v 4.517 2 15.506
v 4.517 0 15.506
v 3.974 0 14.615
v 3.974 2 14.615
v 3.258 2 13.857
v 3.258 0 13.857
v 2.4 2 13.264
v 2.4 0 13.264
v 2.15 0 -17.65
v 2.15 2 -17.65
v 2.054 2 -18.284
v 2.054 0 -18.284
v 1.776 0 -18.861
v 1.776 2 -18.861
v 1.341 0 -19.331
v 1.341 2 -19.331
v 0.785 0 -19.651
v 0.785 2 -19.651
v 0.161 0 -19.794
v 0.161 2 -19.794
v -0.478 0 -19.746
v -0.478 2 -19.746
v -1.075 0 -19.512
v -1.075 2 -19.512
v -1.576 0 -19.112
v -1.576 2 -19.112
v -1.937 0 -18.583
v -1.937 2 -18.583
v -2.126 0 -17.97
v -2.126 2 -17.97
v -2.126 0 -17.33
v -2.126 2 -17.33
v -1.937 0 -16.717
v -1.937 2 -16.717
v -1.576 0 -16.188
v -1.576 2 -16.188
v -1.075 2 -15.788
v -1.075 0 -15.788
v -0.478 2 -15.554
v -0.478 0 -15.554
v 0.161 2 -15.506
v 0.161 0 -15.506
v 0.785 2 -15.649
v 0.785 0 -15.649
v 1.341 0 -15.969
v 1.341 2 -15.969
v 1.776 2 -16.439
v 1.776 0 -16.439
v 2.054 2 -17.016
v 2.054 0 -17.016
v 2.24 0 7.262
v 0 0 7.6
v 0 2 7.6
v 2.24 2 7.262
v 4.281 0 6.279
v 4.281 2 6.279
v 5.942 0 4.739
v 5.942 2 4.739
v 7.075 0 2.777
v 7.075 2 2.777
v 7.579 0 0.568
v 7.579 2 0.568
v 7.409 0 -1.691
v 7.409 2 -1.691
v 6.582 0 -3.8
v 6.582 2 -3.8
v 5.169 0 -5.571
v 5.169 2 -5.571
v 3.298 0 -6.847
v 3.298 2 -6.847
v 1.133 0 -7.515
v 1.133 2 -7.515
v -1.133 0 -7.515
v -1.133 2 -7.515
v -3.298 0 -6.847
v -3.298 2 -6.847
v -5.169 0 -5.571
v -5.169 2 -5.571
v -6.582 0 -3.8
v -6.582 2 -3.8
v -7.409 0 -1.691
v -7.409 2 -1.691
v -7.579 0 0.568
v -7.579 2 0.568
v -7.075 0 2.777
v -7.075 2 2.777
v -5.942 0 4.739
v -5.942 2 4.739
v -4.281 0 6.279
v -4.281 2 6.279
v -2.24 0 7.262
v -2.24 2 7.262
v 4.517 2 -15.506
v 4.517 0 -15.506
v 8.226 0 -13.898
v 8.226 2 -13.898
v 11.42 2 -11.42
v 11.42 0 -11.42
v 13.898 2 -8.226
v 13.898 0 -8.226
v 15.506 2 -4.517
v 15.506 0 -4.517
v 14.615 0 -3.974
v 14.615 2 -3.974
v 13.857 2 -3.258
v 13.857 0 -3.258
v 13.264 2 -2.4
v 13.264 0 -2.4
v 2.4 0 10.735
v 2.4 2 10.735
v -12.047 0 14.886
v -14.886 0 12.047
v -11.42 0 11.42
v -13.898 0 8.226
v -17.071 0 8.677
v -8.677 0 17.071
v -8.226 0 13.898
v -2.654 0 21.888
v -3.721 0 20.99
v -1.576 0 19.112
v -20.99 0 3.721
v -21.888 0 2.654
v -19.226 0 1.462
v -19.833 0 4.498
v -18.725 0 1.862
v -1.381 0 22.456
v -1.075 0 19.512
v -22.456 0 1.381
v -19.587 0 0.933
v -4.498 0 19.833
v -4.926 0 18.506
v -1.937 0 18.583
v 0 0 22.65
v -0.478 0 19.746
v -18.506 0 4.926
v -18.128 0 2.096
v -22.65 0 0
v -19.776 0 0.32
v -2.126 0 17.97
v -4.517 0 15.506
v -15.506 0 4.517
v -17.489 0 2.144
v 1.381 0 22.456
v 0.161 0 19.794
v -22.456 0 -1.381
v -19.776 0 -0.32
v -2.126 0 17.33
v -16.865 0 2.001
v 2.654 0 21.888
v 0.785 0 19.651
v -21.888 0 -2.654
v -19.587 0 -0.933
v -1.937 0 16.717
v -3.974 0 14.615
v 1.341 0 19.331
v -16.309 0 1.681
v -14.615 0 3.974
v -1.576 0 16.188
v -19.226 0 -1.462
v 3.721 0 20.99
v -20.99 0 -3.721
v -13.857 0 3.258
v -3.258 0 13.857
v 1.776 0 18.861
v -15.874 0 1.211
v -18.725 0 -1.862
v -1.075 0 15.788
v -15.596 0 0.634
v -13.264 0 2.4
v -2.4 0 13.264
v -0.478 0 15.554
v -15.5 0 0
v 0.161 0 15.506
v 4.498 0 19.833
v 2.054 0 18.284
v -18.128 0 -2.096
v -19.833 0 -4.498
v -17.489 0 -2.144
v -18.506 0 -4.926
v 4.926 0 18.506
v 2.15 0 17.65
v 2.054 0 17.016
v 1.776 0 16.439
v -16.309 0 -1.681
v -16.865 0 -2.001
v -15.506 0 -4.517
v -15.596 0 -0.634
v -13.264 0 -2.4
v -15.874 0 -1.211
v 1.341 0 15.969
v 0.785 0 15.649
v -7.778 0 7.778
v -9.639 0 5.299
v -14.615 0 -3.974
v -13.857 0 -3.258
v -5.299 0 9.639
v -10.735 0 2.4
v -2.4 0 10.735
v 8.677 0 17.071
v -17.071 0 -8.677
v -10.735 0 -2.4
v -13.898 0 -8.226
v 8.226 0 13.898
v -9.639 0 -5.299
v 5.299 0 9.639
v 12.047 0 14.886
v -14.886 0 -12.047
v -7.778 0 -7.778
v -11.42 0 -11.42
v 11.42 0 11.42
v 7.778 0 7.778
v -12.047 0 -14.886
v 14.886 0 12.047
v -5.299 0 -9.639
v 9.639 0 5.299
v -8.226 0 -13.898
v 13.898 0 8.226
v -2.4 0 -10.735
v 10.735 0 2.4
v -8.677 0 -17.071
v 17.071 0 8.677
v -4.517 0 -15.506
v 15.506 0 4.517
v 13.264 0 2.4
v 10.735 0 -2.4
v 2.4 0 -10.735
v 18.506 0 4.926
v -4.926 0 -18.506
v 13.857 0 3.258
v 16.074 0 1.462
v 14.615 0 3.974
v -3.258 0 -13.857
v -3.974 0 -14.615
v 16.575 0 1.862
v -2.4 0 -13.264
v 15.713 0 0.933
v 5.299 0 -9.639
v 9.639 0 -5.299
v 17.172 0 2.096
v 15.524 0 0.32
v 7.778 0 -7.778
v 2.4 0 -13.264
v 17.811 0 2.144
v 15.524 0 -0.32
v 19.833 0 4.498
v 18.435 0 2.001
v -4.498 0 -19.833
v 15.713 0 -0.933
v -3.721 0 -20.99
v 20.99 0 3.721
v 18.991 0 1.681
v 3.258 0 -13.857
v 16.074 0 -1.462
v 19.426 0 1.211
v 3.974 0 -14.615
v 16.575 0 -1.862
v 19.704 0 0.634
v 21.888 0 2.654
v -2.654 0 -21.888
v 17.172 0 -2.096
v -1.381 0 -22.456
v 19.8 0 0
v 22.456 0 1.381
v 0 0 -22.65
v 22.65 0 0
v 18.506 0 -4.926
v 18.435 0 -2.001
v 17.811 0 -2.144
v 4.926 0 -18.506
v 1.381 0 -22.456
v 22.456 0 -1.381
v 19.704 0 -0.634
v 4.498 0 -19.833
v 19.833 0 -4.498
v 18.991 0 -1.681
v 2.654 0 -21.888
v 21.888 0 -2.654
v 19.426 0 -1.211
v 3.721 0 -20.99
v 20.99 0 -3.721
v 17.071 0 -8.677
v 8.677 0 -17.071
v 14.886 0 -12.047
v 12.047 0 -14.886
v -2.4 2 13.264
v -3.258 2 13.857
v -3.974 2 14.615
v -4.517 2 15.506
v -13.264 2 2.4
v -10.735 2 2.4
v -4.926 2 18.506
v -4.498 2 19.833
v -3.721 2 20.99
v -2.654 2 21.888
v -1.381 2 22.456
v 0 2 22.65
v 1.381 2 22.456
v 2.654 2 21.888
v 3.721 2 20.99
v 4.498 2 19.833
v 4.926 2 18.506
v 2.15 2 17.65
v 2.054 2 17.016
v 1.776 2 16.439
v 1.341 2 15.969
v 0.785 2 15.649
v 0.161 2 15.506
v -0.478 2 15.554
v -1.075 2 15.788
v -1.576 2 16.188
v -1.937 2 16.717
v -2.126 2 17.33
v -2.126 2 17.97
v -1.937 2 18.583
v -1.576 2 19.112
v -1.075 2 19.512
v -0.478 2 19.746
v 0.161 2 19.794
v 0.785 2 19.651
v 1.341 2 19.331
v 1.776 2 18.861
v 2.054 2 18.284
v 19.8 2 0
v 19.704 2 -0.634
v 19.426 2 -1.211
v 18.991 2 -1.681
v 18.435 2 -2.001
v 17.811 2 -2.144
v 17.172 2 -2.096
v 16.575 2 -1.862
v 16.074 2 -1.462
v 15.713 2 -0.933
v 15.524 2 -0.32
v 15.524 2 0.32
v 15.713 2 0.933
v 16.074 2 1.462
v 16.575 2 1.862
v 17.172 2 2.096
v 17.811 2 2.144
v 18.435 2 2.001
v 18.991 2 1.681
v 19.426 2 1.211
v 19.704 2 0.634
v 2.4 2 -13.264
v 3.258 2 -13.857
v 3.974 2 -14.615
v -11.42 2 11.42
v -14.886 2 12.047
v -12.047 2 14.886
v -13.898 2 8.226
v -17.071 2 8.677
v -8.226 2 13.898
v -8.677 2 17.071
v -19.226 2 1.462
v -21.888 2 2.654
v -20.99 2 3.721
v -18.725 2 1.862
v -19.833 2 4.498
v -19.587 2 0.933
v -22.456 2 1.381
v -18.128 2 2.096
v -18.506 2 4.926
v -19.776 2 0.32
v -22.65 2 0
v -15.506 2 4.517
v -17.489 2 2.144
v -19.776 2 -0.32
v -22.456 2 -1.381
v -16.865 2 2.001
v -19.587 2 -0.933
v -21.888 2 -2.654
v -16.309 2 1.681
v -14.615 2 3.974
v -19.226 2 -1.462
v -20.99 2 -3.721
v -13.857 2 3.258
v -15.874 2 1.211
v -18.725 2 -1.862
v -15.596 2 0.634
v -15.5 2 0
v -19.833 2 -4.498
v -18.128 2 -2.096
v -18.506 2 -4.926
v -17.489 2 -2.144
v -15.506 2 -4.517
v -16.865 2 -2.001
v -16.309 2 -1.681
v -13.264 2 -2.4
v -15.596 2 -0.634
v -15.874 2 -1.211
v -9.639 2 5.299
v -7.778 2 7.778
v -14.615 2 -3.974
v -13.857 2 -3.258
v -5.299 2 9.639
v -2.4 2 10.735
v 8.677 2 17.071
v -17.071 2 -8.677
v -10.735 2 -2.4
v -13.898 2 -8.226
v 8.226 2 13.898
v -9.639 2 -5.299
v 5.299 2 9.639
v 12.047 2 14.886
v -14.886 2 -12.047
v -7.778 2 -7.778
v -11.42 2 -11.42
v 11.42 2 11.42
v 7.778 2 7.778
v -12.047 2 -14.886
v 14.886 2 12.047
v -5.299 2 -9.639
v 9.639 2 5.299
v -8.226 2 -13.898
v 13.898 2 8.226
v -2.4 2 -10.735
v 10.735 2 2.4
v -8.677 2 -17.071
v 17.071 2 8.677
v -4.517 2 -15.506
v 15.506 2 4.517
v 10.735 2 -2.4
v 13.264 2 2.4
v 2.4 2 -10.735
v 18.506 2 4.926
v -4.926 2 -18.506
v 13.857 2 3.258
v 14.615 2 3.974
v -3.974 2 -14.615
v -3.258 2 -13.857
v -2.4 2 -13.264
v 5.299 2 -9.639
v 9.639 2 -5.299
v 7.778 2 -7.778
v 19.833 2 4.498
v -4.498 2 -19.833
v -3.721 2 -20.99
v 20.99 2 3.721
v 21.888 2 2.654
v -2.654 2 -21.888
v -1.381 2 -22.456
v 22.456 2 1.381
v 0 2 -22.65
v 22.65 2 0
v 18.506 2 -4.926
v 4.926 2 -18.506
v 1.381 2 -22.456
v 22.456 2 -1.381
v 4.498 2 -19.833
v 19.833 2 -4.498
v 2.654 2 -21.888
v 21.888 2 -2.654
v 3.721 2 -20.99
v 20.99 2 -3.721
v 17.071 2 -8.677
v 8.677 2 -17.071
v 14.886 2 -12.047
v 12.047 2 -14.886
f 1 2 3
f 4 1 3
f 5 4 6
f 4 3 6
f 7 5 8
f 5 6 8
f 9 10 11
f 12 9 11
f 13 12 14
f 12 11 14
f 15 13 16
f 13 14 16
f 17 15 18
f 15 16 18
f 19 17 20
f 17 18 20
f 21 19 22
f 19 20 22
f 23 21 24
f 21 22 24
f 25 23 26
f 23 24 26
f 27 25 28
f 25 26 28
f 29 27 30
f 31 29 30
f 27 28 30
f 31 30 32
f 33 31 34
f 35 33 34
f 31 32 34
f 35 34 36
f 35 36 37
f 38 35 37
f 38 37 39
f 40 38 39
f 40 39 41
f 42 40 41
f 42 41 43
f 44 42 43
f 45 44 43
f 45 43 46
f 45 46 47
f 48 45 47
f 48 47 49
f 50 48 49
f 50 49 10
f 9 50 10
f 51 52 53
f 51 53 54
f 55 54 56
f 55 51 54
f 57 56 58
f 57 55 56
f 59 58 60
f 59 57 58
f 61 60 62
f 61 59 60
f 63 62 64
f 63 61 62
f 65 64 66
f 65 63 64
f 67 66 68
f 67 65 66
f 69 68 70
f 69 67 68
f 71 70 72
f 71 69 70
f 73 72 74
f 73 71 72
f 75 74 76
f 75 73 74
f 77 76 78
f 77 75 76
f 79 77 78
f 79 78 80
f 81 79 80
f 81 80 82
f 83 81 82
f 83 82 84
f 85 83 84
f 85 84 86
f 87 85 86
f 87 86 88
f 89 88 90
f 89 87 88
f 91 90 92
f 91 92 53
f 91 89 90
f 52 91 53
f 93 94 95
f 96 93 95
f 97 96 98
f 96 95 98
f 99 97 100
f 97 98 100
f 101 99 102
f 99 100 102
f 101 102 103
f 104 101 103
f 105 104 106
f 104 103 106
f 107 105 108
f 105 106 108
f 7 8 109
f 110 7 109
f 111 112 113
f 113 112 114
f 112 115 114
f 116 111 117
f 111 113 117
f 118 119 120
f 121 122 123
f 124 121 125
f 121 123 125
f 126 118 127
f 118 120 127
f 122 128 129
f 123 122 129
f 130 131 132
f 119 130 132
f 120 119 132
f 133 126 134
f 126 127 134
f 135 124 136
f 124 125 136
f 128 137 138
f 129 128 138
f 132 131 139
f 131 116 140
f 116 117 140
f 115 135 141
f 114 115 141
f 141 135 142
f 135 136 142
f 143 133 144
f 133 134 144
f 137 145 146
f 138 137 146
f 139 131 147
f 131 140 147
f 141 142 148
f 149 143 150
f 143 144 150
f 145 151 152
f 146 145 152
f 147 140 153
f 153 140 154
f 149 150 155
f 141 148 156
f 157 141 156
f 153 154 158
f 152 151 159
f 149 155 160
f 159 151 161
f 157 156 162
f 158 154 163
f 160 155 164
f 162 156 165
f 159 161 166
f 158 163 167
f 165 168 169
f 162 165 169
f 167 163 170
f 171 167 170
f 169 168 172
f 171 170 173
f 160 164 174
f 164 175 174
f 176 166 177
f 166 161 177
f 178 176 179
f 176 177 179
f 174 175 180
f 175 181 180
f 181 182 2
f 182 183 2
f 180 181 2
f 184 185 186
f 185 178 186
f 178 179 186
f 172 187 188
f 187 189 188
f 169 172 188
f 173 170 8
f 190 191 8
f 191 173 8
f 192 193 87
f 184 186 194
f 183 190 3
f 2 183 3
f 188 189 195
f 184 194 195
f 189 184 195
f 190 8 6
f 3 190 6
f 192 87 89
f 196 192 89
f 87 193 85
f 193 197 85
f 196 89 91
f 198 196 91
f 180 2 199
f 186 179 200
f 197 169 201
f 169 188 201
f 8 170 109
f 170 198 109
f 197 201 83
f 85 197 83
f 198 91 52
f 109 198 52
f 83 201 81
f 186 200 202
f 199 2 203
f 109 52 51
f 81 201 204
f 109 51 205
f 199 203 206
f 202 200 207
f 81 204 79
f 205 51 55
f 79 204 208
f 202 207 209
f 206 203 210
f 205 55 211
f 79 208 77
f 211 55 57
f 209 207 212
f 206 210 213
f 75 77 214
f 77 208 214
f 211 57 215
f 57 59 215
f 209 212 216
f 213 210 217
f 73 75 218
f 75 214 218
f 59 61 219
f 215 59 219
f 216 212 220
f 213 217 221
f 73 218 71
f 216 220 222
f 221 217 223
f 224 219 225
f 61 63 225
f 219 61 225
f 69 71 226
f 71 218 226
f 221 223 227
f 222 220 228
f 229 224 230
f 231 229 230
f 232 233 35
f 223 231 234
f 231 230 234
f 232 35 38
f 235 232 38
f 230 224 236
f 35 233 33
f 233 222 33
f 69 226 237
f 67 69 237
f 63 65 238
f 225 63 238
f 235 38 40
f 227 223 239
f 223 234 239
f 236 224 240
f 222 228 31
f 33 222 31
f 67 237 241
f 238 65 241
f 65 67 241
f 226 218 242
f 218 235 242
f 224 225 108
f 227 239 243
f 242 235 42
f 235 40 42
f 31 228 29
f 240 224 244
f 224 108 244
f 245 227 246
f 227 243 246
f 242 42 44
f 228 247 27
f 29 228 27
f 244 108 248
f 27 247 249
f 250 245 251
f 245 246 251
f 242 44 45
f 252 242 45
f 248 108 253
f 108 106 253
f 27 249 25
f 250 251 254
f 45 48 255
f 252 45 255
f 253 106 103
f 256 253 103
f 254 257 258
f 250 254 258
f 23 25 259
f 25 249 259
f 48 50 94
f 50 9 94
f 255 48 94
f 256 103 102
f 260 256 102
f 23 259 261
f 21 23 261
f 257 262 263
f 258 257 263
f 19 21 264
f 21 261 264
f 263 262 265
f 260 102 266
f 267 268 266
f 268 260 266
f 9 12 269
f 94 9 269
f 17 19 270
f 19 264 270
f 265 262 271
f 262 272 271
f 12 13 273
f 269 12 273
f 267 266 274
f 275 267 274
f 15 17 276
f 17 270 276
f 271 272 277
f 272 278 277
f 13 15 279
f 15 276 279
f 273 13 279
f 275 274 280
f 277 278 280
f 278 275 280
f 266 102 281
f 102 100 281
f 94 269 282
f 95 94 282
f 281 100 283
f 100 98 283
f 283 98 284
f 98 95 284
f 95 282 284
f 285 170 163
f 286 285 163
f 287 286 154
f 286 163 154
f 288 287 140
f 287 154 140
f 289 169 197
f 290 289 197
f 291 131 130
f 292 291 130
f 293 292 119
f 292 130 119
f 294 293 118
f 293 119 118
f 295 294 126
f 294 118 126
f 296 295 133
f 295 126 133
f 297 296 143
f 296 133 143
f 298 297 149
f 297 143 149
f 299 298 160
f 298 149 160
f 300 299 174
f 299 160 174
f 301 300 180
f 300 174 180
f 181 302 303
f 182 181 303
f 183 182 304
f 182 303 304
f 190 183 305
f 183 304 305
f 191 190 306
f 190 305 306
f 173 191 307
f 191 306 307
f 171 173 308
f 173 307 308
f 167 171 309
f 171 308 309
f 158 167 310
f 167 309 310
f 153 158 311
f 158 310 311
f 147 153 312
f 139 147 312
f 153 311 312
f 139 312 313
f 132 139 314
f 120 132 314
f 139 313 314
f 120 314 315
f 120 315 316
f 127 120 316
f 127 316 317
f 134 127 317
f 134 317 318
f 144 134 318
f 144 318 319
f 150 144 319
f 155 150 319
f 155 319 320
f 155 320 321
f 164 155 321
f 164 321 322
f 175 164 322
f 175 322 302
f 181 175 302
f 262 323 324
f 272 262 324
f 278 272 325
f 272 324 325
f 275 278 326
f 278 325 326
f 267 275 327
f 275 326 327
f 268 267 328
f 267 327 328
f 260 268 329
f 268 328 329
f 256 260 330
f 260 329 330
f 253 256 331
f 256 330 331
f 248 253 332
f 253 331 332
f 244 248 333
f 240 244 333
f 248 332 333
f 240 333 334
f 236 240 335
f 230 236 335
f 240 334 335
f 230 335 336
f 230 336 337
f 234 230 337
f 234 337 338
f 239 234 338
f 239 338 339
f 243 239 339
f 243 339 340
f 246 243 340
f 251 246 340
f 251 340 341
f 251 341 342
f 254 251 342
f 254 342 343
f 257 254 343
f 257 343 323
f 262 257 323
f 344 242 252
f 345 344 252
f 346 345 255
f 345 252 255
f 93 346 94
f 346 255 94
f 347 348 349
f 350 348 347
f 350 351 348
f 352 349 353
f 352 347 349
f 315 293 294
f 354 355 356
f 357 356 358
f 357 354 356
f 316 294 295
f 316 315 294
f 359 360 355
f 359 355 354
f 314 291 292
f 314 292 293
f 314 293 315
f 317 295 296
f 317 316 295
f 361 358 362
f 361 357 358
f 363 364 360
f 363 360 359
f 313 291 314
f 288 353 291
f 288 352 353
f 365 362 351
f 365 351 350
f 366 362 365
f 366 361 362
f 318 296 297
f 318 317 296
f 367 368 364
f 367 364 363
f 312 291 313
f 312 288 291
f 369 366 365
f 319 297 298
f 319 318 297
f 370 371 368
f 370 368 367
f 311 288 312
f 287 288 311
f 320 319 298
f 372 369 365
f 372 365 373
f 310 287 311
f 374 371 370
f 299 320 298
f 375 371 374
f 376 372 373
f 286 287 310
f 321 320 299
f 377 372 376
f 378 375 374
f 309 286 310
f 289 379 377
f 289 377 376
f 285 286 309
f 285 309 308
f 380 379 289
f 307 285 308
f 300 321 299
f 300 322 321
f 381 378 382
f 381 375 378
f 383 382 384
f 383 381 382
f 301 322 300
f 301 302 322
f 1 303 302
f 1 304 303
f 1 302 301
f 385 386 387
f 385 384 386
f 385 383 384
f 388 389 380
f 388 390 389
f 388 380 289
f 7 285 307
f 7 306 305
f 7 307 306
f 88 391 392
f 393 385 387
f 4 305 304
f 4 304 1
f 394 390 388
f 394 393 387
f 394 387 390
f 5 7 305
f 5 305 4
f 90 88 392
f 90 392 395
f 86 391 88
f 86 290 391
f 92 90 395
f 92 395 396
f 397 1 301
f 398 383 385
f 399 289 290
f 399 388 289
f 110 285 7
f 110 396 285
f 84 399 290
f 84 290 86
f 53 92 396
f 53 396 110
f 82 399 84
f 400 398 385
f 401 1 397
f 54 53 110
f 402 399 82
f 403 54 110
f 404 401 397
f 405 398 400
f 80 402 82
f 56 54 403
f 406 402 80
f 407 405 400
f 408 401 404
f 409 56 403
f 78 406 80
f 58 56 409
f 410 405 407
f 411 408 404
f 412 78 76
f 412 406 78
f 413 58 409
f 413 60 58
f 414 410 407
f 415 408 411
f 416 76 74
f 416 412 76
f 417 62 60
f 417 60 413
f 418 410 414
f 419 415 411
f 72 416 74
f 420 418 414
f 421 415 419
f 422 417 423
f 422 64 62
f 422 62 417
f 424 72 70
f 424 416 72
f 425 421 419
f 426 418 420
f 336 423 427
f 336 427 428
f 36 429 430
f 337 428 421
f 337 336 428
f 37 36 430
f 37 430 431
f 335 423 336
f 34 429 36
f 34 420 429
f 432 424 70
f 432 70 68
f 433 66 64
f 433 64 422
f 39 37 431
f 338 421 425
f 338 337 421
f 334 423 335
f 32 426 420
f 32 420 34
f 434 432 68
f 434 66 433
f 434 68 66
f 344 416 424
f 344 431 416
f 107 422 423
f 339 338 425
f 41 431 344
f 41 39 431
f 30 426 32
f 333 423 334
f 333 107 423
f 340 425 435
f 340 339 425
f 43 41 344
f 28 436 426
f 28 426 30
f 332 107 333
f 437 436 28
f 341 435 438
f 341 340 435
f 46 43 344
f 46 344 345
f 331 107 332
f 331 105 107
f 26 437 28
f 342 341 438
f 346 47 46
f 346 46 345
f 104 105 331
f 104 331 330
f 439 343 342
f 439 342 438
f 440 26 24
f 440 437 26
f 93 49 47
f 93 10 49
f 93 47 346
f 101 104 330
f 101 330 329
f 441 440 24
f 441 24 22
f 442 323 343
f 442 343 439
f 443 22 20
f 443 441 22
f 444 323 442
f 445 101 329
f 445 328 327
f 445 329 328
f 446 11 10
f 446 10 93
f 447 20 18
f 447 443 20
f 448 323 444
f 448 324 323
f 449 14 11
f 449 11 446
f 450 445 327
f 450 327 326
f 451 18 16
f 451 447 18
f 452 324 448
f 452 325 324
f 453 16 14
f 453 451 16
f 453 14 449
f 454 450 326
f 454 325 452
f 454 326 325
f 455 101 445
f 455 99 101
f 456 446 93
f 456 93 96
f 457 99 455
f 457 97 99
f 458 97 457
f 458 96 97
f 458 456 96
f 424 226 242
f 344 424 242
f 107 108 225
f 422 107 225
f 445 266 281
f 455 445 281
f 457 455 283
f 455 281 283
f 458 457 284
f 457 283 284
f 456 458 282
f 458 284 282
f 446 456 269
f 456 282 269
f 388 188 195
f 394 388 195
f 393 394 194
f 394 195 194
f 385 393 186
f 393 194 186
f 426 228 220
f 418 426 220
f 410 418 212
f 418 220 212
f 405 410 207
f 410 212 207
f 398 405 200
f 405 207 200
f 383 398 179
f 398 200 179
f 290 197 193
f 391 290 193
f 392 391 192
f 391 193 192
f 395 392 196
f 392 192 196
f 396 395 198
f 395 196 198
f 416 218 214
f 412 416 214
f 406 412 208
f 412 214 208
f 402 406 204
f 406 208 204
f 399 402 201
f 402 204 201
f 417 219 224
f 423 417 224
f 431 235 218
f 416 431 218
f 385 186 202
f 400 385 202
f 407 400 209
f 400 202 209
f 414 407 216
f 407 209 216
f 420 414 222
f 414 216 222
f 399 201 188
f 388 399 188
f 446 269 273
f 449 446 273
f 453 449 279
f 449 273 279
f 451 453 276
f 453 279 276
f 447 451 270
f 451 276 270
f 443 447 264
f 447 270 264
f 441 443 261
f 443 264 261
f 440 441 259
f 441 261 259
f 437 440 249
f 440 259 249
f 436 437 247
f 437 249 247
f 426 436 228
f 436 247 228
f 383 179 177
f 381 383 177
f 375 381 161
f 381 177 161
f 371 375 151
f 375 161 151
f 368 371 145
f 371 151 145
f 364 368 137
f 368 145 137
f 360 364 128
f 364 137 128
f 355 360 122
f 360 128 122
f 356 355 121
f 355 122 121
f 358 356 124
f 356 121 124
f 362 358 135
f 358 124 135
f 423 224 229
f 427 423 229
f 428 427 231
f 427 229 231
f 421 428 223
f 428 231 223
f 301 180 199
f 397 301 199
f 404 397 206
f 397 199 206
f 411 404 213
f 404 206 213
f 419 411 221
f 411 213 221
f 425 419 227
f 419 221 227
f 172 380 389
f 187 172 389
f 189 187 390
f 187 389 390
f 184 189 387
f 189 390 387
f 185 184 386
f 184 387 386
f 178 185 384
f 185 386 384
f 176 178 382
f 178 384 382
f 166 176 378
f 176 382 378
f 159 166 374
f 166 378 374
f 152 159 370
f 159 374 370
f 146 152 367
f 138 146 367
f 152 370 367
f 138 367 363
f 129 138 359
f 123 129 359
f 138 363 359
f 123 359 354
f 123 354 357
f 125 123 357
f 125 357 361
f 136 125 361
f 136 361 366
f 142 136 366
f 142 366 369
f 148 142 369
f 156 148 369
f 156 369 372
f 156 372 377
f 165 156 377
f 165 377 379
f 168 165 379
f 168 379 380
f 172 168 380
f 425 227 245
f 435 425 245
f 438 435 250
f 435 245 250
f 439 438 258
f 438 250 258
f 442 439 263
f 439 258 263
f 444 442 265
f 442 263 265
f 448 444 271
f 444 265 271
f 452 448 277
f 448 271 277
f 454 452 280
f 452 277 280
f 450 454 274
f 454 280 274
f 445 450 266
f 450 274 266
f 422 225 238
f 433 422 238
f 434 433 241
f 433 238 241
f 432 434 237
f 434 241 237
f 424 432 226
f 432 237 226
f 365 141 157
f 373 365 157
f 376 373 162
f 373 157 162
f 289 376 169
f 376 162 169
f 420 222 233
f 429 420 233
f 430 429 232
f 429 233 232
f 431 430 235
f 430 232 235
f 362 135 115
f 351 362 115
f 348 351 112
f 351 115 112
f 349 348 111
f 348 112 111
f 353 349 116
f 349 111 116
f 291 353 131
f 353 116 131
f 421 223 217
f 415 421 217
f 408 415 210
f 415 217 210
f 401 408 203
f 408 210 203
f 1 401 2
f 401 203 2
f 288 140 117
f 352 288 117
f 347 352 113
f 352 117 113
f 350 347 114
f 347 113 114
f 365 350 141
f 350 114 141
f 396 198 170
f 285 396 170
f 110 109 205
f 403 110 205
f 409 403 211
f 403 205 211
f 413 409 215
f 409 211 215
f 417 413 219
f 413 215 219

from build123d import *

# Parameters (mm, degrees)
SKETCH1_R                = 7.6
BOSS_EXTRUDE1_DEPTH      = 2
M4_CLEARANCE_HOLE1_D     = 4.3
M4_CLEARANCE_HOLE1_DEPTH = 8
M4_CLEARANCE_HOLE1_TIP   = 1.291850331


with BuildPart() as part:
    # Sketch1 → Boss-Extrude1 (new body)
    with BuildSketch(Plane(origin=(0, 0, 0), x_dir=(1, 0, 0), z_dir=(0, 1, 0))):
        with BuildLine():
            ThreePointArc((-4.926264158, -18.505524079), (0, -22.65), (4.926264158, -18.505524079))
            ThreePointArc((4.926264158, -18.505524079), (13.54109486, -13.54109486), (18.505524079, -4.926264158))
            ThreePointArc((18.505524079, -4.926264158), (22.65, 0), (18.505524079, 4.926264158))
            ThreePointArc((18.505524079, 4.926264158), (13.54109486, 13.54109486), (4.926264158, 18.505524079))
            ThreePointArc((4.926264158, 18.505524079), (0, 22.65), (-4.926264158, 18.505524079))
            ThreePointArc((-4.926264158, 18.505524079), (-13.54109486, 13.54109486), (-18.505524079, 4.926264158))
            ThreePointArc((-18.505524079, 4.926264158), (-22.65, 0), (-18.505524079, -4.926264158))
            ThreePointArc((-18.505524079, -4.926264158), (-13.54109486, -13.54109486), (-4.926264158, -18.505524079))
        make_face()
        with BuildLine():
            ThreePointArc((-4.516771305, -15.505524079), (-11.419774516, -11.419774516), (-15.505524079, -4.516771305))
            ThreePointArc((-15.505524079, -4.516771305), (-14.21735127, -3.635508588), (-13.26365756, -2.4))
            Line((-13.26365756, -2.4), (-10.73498952, -2.4))
            ThreePointArc((-10.73498952, -2.4), (-7.778174593, -7.778174593), (-2.4, -10.73498952))
            Line((-2.4, -10.73498952), (-2.4, -13.26365756))
            ThreePointArc((-2.4, -13.26365756), (-3.635508588, -14.21735127), (-4.516771305, -15.505524079))
        make_face(mode=Mode.SUBTRACT)
        with BuildLine():
            ThreePointArc((4.516771305, -15.505524079), (3.635508588, -14.21735127), (2.4, -13.26365756))
            Line((2.4, -13.26365756), (2.4, -10.73498952))
            ThreePointArc((2.4, -10.73498952), (7.778174593, -7.778174593), (10.73498952, -2.4))
            Line((10.73498952, -2.4), (13.26365756, -2.4))
            ThreePointArc((13.26365756, -2.4), (14.21735127, -3.635508588), (15.505524079, -4.516771305))
            ThreePointArc((15.505524079, -4.516771305), (11.419774516, -11.419774516), (4.516771305, -15.505524079))
        make_face(mode=Mode.SUBTRACT)
        with BuildLine():
            Line((-10.73498952, 2.4), (-13.26365756, 2.4))
            ThreePointArc((-13.26365756, 2.4), (-14.21735127, 3.635508588), (-15.505524079, 4.516771305))
            ThreePointArc((-15.505524079, 4.516771305), (-11.419774516, 11.419774516), (-4.516771305, 15.505524079))
            ThreePointArc((-4.516771305, 15.505524079), (-3.635508588, 14.21735127), (-2.4, 13.26365756))
            Line((-2.4, 13.26365756), (-2.4, 10.73498952))
            ThreePointArc((-2.4, 10.73498952), (-7.778174593, 7.778174593), (-10.73498952, 2.4))
        make_face(mode=Mode.SUBTRACT)
        with Locations(Location((0, 0, 0), (0, 0, 270))):
            Circle(SKETCH1_R, mode=Mode.SUBTRACT)
        with BuildLine():
            Line((2.4, 10.73498952), (2.4, 13.26365756))
            ThreePointArc((2.4, 13.26365756), (3.635508588, 14.21735127), (4.516771305, 15.505524079))
            ThreePointArc((4.516771305, 15.505524079), (11.419774516, 11.419774516), (15.505524079, 4.516771305))
            ThreePointArc((15.505524079, 4.516771305), (14.21735127, 3.635508588), (13.26365756, 2.4))
            Line((13.26365756, 2.4), (10.73498952, 2.4))
            ThreePointArc((10.73498952, 2.4), (7.778174593, 7.778174593), (2.4, 10.73498952))
        make_face(mode=Mode.SUBTRACT)
    extrude(amount=BOSS_EXTRUDE1_DEPTH)

    # M4 Clearance Hole1
    with Locations(Plane(origin=(0, 0, 0), x_dir=(-1, 0, 0), z_dir=(0, -1, 0))):
        with Locations((-17.65, 0), (0, 17.65), (17.65, 0), (0, -17.65)):
            Hole(M4_CLEARANCE_HOLE1_D / 2, depth=M4_CLEARANCE_HOLE1_DEPTH)
            with Locations((0, 0, -(M4_CLEARANCE_HOLE1_DEPTH + M4_CLEARANCE_HOLE1_TIP / 2))):  # 118° drill point
                Cone(0, M4_CLEARANCE_HOLE1_D / 2, M4_CLEARANCE_HOLE1_TIP, mode=Mode.SUBTRACT)


solid = part.part
